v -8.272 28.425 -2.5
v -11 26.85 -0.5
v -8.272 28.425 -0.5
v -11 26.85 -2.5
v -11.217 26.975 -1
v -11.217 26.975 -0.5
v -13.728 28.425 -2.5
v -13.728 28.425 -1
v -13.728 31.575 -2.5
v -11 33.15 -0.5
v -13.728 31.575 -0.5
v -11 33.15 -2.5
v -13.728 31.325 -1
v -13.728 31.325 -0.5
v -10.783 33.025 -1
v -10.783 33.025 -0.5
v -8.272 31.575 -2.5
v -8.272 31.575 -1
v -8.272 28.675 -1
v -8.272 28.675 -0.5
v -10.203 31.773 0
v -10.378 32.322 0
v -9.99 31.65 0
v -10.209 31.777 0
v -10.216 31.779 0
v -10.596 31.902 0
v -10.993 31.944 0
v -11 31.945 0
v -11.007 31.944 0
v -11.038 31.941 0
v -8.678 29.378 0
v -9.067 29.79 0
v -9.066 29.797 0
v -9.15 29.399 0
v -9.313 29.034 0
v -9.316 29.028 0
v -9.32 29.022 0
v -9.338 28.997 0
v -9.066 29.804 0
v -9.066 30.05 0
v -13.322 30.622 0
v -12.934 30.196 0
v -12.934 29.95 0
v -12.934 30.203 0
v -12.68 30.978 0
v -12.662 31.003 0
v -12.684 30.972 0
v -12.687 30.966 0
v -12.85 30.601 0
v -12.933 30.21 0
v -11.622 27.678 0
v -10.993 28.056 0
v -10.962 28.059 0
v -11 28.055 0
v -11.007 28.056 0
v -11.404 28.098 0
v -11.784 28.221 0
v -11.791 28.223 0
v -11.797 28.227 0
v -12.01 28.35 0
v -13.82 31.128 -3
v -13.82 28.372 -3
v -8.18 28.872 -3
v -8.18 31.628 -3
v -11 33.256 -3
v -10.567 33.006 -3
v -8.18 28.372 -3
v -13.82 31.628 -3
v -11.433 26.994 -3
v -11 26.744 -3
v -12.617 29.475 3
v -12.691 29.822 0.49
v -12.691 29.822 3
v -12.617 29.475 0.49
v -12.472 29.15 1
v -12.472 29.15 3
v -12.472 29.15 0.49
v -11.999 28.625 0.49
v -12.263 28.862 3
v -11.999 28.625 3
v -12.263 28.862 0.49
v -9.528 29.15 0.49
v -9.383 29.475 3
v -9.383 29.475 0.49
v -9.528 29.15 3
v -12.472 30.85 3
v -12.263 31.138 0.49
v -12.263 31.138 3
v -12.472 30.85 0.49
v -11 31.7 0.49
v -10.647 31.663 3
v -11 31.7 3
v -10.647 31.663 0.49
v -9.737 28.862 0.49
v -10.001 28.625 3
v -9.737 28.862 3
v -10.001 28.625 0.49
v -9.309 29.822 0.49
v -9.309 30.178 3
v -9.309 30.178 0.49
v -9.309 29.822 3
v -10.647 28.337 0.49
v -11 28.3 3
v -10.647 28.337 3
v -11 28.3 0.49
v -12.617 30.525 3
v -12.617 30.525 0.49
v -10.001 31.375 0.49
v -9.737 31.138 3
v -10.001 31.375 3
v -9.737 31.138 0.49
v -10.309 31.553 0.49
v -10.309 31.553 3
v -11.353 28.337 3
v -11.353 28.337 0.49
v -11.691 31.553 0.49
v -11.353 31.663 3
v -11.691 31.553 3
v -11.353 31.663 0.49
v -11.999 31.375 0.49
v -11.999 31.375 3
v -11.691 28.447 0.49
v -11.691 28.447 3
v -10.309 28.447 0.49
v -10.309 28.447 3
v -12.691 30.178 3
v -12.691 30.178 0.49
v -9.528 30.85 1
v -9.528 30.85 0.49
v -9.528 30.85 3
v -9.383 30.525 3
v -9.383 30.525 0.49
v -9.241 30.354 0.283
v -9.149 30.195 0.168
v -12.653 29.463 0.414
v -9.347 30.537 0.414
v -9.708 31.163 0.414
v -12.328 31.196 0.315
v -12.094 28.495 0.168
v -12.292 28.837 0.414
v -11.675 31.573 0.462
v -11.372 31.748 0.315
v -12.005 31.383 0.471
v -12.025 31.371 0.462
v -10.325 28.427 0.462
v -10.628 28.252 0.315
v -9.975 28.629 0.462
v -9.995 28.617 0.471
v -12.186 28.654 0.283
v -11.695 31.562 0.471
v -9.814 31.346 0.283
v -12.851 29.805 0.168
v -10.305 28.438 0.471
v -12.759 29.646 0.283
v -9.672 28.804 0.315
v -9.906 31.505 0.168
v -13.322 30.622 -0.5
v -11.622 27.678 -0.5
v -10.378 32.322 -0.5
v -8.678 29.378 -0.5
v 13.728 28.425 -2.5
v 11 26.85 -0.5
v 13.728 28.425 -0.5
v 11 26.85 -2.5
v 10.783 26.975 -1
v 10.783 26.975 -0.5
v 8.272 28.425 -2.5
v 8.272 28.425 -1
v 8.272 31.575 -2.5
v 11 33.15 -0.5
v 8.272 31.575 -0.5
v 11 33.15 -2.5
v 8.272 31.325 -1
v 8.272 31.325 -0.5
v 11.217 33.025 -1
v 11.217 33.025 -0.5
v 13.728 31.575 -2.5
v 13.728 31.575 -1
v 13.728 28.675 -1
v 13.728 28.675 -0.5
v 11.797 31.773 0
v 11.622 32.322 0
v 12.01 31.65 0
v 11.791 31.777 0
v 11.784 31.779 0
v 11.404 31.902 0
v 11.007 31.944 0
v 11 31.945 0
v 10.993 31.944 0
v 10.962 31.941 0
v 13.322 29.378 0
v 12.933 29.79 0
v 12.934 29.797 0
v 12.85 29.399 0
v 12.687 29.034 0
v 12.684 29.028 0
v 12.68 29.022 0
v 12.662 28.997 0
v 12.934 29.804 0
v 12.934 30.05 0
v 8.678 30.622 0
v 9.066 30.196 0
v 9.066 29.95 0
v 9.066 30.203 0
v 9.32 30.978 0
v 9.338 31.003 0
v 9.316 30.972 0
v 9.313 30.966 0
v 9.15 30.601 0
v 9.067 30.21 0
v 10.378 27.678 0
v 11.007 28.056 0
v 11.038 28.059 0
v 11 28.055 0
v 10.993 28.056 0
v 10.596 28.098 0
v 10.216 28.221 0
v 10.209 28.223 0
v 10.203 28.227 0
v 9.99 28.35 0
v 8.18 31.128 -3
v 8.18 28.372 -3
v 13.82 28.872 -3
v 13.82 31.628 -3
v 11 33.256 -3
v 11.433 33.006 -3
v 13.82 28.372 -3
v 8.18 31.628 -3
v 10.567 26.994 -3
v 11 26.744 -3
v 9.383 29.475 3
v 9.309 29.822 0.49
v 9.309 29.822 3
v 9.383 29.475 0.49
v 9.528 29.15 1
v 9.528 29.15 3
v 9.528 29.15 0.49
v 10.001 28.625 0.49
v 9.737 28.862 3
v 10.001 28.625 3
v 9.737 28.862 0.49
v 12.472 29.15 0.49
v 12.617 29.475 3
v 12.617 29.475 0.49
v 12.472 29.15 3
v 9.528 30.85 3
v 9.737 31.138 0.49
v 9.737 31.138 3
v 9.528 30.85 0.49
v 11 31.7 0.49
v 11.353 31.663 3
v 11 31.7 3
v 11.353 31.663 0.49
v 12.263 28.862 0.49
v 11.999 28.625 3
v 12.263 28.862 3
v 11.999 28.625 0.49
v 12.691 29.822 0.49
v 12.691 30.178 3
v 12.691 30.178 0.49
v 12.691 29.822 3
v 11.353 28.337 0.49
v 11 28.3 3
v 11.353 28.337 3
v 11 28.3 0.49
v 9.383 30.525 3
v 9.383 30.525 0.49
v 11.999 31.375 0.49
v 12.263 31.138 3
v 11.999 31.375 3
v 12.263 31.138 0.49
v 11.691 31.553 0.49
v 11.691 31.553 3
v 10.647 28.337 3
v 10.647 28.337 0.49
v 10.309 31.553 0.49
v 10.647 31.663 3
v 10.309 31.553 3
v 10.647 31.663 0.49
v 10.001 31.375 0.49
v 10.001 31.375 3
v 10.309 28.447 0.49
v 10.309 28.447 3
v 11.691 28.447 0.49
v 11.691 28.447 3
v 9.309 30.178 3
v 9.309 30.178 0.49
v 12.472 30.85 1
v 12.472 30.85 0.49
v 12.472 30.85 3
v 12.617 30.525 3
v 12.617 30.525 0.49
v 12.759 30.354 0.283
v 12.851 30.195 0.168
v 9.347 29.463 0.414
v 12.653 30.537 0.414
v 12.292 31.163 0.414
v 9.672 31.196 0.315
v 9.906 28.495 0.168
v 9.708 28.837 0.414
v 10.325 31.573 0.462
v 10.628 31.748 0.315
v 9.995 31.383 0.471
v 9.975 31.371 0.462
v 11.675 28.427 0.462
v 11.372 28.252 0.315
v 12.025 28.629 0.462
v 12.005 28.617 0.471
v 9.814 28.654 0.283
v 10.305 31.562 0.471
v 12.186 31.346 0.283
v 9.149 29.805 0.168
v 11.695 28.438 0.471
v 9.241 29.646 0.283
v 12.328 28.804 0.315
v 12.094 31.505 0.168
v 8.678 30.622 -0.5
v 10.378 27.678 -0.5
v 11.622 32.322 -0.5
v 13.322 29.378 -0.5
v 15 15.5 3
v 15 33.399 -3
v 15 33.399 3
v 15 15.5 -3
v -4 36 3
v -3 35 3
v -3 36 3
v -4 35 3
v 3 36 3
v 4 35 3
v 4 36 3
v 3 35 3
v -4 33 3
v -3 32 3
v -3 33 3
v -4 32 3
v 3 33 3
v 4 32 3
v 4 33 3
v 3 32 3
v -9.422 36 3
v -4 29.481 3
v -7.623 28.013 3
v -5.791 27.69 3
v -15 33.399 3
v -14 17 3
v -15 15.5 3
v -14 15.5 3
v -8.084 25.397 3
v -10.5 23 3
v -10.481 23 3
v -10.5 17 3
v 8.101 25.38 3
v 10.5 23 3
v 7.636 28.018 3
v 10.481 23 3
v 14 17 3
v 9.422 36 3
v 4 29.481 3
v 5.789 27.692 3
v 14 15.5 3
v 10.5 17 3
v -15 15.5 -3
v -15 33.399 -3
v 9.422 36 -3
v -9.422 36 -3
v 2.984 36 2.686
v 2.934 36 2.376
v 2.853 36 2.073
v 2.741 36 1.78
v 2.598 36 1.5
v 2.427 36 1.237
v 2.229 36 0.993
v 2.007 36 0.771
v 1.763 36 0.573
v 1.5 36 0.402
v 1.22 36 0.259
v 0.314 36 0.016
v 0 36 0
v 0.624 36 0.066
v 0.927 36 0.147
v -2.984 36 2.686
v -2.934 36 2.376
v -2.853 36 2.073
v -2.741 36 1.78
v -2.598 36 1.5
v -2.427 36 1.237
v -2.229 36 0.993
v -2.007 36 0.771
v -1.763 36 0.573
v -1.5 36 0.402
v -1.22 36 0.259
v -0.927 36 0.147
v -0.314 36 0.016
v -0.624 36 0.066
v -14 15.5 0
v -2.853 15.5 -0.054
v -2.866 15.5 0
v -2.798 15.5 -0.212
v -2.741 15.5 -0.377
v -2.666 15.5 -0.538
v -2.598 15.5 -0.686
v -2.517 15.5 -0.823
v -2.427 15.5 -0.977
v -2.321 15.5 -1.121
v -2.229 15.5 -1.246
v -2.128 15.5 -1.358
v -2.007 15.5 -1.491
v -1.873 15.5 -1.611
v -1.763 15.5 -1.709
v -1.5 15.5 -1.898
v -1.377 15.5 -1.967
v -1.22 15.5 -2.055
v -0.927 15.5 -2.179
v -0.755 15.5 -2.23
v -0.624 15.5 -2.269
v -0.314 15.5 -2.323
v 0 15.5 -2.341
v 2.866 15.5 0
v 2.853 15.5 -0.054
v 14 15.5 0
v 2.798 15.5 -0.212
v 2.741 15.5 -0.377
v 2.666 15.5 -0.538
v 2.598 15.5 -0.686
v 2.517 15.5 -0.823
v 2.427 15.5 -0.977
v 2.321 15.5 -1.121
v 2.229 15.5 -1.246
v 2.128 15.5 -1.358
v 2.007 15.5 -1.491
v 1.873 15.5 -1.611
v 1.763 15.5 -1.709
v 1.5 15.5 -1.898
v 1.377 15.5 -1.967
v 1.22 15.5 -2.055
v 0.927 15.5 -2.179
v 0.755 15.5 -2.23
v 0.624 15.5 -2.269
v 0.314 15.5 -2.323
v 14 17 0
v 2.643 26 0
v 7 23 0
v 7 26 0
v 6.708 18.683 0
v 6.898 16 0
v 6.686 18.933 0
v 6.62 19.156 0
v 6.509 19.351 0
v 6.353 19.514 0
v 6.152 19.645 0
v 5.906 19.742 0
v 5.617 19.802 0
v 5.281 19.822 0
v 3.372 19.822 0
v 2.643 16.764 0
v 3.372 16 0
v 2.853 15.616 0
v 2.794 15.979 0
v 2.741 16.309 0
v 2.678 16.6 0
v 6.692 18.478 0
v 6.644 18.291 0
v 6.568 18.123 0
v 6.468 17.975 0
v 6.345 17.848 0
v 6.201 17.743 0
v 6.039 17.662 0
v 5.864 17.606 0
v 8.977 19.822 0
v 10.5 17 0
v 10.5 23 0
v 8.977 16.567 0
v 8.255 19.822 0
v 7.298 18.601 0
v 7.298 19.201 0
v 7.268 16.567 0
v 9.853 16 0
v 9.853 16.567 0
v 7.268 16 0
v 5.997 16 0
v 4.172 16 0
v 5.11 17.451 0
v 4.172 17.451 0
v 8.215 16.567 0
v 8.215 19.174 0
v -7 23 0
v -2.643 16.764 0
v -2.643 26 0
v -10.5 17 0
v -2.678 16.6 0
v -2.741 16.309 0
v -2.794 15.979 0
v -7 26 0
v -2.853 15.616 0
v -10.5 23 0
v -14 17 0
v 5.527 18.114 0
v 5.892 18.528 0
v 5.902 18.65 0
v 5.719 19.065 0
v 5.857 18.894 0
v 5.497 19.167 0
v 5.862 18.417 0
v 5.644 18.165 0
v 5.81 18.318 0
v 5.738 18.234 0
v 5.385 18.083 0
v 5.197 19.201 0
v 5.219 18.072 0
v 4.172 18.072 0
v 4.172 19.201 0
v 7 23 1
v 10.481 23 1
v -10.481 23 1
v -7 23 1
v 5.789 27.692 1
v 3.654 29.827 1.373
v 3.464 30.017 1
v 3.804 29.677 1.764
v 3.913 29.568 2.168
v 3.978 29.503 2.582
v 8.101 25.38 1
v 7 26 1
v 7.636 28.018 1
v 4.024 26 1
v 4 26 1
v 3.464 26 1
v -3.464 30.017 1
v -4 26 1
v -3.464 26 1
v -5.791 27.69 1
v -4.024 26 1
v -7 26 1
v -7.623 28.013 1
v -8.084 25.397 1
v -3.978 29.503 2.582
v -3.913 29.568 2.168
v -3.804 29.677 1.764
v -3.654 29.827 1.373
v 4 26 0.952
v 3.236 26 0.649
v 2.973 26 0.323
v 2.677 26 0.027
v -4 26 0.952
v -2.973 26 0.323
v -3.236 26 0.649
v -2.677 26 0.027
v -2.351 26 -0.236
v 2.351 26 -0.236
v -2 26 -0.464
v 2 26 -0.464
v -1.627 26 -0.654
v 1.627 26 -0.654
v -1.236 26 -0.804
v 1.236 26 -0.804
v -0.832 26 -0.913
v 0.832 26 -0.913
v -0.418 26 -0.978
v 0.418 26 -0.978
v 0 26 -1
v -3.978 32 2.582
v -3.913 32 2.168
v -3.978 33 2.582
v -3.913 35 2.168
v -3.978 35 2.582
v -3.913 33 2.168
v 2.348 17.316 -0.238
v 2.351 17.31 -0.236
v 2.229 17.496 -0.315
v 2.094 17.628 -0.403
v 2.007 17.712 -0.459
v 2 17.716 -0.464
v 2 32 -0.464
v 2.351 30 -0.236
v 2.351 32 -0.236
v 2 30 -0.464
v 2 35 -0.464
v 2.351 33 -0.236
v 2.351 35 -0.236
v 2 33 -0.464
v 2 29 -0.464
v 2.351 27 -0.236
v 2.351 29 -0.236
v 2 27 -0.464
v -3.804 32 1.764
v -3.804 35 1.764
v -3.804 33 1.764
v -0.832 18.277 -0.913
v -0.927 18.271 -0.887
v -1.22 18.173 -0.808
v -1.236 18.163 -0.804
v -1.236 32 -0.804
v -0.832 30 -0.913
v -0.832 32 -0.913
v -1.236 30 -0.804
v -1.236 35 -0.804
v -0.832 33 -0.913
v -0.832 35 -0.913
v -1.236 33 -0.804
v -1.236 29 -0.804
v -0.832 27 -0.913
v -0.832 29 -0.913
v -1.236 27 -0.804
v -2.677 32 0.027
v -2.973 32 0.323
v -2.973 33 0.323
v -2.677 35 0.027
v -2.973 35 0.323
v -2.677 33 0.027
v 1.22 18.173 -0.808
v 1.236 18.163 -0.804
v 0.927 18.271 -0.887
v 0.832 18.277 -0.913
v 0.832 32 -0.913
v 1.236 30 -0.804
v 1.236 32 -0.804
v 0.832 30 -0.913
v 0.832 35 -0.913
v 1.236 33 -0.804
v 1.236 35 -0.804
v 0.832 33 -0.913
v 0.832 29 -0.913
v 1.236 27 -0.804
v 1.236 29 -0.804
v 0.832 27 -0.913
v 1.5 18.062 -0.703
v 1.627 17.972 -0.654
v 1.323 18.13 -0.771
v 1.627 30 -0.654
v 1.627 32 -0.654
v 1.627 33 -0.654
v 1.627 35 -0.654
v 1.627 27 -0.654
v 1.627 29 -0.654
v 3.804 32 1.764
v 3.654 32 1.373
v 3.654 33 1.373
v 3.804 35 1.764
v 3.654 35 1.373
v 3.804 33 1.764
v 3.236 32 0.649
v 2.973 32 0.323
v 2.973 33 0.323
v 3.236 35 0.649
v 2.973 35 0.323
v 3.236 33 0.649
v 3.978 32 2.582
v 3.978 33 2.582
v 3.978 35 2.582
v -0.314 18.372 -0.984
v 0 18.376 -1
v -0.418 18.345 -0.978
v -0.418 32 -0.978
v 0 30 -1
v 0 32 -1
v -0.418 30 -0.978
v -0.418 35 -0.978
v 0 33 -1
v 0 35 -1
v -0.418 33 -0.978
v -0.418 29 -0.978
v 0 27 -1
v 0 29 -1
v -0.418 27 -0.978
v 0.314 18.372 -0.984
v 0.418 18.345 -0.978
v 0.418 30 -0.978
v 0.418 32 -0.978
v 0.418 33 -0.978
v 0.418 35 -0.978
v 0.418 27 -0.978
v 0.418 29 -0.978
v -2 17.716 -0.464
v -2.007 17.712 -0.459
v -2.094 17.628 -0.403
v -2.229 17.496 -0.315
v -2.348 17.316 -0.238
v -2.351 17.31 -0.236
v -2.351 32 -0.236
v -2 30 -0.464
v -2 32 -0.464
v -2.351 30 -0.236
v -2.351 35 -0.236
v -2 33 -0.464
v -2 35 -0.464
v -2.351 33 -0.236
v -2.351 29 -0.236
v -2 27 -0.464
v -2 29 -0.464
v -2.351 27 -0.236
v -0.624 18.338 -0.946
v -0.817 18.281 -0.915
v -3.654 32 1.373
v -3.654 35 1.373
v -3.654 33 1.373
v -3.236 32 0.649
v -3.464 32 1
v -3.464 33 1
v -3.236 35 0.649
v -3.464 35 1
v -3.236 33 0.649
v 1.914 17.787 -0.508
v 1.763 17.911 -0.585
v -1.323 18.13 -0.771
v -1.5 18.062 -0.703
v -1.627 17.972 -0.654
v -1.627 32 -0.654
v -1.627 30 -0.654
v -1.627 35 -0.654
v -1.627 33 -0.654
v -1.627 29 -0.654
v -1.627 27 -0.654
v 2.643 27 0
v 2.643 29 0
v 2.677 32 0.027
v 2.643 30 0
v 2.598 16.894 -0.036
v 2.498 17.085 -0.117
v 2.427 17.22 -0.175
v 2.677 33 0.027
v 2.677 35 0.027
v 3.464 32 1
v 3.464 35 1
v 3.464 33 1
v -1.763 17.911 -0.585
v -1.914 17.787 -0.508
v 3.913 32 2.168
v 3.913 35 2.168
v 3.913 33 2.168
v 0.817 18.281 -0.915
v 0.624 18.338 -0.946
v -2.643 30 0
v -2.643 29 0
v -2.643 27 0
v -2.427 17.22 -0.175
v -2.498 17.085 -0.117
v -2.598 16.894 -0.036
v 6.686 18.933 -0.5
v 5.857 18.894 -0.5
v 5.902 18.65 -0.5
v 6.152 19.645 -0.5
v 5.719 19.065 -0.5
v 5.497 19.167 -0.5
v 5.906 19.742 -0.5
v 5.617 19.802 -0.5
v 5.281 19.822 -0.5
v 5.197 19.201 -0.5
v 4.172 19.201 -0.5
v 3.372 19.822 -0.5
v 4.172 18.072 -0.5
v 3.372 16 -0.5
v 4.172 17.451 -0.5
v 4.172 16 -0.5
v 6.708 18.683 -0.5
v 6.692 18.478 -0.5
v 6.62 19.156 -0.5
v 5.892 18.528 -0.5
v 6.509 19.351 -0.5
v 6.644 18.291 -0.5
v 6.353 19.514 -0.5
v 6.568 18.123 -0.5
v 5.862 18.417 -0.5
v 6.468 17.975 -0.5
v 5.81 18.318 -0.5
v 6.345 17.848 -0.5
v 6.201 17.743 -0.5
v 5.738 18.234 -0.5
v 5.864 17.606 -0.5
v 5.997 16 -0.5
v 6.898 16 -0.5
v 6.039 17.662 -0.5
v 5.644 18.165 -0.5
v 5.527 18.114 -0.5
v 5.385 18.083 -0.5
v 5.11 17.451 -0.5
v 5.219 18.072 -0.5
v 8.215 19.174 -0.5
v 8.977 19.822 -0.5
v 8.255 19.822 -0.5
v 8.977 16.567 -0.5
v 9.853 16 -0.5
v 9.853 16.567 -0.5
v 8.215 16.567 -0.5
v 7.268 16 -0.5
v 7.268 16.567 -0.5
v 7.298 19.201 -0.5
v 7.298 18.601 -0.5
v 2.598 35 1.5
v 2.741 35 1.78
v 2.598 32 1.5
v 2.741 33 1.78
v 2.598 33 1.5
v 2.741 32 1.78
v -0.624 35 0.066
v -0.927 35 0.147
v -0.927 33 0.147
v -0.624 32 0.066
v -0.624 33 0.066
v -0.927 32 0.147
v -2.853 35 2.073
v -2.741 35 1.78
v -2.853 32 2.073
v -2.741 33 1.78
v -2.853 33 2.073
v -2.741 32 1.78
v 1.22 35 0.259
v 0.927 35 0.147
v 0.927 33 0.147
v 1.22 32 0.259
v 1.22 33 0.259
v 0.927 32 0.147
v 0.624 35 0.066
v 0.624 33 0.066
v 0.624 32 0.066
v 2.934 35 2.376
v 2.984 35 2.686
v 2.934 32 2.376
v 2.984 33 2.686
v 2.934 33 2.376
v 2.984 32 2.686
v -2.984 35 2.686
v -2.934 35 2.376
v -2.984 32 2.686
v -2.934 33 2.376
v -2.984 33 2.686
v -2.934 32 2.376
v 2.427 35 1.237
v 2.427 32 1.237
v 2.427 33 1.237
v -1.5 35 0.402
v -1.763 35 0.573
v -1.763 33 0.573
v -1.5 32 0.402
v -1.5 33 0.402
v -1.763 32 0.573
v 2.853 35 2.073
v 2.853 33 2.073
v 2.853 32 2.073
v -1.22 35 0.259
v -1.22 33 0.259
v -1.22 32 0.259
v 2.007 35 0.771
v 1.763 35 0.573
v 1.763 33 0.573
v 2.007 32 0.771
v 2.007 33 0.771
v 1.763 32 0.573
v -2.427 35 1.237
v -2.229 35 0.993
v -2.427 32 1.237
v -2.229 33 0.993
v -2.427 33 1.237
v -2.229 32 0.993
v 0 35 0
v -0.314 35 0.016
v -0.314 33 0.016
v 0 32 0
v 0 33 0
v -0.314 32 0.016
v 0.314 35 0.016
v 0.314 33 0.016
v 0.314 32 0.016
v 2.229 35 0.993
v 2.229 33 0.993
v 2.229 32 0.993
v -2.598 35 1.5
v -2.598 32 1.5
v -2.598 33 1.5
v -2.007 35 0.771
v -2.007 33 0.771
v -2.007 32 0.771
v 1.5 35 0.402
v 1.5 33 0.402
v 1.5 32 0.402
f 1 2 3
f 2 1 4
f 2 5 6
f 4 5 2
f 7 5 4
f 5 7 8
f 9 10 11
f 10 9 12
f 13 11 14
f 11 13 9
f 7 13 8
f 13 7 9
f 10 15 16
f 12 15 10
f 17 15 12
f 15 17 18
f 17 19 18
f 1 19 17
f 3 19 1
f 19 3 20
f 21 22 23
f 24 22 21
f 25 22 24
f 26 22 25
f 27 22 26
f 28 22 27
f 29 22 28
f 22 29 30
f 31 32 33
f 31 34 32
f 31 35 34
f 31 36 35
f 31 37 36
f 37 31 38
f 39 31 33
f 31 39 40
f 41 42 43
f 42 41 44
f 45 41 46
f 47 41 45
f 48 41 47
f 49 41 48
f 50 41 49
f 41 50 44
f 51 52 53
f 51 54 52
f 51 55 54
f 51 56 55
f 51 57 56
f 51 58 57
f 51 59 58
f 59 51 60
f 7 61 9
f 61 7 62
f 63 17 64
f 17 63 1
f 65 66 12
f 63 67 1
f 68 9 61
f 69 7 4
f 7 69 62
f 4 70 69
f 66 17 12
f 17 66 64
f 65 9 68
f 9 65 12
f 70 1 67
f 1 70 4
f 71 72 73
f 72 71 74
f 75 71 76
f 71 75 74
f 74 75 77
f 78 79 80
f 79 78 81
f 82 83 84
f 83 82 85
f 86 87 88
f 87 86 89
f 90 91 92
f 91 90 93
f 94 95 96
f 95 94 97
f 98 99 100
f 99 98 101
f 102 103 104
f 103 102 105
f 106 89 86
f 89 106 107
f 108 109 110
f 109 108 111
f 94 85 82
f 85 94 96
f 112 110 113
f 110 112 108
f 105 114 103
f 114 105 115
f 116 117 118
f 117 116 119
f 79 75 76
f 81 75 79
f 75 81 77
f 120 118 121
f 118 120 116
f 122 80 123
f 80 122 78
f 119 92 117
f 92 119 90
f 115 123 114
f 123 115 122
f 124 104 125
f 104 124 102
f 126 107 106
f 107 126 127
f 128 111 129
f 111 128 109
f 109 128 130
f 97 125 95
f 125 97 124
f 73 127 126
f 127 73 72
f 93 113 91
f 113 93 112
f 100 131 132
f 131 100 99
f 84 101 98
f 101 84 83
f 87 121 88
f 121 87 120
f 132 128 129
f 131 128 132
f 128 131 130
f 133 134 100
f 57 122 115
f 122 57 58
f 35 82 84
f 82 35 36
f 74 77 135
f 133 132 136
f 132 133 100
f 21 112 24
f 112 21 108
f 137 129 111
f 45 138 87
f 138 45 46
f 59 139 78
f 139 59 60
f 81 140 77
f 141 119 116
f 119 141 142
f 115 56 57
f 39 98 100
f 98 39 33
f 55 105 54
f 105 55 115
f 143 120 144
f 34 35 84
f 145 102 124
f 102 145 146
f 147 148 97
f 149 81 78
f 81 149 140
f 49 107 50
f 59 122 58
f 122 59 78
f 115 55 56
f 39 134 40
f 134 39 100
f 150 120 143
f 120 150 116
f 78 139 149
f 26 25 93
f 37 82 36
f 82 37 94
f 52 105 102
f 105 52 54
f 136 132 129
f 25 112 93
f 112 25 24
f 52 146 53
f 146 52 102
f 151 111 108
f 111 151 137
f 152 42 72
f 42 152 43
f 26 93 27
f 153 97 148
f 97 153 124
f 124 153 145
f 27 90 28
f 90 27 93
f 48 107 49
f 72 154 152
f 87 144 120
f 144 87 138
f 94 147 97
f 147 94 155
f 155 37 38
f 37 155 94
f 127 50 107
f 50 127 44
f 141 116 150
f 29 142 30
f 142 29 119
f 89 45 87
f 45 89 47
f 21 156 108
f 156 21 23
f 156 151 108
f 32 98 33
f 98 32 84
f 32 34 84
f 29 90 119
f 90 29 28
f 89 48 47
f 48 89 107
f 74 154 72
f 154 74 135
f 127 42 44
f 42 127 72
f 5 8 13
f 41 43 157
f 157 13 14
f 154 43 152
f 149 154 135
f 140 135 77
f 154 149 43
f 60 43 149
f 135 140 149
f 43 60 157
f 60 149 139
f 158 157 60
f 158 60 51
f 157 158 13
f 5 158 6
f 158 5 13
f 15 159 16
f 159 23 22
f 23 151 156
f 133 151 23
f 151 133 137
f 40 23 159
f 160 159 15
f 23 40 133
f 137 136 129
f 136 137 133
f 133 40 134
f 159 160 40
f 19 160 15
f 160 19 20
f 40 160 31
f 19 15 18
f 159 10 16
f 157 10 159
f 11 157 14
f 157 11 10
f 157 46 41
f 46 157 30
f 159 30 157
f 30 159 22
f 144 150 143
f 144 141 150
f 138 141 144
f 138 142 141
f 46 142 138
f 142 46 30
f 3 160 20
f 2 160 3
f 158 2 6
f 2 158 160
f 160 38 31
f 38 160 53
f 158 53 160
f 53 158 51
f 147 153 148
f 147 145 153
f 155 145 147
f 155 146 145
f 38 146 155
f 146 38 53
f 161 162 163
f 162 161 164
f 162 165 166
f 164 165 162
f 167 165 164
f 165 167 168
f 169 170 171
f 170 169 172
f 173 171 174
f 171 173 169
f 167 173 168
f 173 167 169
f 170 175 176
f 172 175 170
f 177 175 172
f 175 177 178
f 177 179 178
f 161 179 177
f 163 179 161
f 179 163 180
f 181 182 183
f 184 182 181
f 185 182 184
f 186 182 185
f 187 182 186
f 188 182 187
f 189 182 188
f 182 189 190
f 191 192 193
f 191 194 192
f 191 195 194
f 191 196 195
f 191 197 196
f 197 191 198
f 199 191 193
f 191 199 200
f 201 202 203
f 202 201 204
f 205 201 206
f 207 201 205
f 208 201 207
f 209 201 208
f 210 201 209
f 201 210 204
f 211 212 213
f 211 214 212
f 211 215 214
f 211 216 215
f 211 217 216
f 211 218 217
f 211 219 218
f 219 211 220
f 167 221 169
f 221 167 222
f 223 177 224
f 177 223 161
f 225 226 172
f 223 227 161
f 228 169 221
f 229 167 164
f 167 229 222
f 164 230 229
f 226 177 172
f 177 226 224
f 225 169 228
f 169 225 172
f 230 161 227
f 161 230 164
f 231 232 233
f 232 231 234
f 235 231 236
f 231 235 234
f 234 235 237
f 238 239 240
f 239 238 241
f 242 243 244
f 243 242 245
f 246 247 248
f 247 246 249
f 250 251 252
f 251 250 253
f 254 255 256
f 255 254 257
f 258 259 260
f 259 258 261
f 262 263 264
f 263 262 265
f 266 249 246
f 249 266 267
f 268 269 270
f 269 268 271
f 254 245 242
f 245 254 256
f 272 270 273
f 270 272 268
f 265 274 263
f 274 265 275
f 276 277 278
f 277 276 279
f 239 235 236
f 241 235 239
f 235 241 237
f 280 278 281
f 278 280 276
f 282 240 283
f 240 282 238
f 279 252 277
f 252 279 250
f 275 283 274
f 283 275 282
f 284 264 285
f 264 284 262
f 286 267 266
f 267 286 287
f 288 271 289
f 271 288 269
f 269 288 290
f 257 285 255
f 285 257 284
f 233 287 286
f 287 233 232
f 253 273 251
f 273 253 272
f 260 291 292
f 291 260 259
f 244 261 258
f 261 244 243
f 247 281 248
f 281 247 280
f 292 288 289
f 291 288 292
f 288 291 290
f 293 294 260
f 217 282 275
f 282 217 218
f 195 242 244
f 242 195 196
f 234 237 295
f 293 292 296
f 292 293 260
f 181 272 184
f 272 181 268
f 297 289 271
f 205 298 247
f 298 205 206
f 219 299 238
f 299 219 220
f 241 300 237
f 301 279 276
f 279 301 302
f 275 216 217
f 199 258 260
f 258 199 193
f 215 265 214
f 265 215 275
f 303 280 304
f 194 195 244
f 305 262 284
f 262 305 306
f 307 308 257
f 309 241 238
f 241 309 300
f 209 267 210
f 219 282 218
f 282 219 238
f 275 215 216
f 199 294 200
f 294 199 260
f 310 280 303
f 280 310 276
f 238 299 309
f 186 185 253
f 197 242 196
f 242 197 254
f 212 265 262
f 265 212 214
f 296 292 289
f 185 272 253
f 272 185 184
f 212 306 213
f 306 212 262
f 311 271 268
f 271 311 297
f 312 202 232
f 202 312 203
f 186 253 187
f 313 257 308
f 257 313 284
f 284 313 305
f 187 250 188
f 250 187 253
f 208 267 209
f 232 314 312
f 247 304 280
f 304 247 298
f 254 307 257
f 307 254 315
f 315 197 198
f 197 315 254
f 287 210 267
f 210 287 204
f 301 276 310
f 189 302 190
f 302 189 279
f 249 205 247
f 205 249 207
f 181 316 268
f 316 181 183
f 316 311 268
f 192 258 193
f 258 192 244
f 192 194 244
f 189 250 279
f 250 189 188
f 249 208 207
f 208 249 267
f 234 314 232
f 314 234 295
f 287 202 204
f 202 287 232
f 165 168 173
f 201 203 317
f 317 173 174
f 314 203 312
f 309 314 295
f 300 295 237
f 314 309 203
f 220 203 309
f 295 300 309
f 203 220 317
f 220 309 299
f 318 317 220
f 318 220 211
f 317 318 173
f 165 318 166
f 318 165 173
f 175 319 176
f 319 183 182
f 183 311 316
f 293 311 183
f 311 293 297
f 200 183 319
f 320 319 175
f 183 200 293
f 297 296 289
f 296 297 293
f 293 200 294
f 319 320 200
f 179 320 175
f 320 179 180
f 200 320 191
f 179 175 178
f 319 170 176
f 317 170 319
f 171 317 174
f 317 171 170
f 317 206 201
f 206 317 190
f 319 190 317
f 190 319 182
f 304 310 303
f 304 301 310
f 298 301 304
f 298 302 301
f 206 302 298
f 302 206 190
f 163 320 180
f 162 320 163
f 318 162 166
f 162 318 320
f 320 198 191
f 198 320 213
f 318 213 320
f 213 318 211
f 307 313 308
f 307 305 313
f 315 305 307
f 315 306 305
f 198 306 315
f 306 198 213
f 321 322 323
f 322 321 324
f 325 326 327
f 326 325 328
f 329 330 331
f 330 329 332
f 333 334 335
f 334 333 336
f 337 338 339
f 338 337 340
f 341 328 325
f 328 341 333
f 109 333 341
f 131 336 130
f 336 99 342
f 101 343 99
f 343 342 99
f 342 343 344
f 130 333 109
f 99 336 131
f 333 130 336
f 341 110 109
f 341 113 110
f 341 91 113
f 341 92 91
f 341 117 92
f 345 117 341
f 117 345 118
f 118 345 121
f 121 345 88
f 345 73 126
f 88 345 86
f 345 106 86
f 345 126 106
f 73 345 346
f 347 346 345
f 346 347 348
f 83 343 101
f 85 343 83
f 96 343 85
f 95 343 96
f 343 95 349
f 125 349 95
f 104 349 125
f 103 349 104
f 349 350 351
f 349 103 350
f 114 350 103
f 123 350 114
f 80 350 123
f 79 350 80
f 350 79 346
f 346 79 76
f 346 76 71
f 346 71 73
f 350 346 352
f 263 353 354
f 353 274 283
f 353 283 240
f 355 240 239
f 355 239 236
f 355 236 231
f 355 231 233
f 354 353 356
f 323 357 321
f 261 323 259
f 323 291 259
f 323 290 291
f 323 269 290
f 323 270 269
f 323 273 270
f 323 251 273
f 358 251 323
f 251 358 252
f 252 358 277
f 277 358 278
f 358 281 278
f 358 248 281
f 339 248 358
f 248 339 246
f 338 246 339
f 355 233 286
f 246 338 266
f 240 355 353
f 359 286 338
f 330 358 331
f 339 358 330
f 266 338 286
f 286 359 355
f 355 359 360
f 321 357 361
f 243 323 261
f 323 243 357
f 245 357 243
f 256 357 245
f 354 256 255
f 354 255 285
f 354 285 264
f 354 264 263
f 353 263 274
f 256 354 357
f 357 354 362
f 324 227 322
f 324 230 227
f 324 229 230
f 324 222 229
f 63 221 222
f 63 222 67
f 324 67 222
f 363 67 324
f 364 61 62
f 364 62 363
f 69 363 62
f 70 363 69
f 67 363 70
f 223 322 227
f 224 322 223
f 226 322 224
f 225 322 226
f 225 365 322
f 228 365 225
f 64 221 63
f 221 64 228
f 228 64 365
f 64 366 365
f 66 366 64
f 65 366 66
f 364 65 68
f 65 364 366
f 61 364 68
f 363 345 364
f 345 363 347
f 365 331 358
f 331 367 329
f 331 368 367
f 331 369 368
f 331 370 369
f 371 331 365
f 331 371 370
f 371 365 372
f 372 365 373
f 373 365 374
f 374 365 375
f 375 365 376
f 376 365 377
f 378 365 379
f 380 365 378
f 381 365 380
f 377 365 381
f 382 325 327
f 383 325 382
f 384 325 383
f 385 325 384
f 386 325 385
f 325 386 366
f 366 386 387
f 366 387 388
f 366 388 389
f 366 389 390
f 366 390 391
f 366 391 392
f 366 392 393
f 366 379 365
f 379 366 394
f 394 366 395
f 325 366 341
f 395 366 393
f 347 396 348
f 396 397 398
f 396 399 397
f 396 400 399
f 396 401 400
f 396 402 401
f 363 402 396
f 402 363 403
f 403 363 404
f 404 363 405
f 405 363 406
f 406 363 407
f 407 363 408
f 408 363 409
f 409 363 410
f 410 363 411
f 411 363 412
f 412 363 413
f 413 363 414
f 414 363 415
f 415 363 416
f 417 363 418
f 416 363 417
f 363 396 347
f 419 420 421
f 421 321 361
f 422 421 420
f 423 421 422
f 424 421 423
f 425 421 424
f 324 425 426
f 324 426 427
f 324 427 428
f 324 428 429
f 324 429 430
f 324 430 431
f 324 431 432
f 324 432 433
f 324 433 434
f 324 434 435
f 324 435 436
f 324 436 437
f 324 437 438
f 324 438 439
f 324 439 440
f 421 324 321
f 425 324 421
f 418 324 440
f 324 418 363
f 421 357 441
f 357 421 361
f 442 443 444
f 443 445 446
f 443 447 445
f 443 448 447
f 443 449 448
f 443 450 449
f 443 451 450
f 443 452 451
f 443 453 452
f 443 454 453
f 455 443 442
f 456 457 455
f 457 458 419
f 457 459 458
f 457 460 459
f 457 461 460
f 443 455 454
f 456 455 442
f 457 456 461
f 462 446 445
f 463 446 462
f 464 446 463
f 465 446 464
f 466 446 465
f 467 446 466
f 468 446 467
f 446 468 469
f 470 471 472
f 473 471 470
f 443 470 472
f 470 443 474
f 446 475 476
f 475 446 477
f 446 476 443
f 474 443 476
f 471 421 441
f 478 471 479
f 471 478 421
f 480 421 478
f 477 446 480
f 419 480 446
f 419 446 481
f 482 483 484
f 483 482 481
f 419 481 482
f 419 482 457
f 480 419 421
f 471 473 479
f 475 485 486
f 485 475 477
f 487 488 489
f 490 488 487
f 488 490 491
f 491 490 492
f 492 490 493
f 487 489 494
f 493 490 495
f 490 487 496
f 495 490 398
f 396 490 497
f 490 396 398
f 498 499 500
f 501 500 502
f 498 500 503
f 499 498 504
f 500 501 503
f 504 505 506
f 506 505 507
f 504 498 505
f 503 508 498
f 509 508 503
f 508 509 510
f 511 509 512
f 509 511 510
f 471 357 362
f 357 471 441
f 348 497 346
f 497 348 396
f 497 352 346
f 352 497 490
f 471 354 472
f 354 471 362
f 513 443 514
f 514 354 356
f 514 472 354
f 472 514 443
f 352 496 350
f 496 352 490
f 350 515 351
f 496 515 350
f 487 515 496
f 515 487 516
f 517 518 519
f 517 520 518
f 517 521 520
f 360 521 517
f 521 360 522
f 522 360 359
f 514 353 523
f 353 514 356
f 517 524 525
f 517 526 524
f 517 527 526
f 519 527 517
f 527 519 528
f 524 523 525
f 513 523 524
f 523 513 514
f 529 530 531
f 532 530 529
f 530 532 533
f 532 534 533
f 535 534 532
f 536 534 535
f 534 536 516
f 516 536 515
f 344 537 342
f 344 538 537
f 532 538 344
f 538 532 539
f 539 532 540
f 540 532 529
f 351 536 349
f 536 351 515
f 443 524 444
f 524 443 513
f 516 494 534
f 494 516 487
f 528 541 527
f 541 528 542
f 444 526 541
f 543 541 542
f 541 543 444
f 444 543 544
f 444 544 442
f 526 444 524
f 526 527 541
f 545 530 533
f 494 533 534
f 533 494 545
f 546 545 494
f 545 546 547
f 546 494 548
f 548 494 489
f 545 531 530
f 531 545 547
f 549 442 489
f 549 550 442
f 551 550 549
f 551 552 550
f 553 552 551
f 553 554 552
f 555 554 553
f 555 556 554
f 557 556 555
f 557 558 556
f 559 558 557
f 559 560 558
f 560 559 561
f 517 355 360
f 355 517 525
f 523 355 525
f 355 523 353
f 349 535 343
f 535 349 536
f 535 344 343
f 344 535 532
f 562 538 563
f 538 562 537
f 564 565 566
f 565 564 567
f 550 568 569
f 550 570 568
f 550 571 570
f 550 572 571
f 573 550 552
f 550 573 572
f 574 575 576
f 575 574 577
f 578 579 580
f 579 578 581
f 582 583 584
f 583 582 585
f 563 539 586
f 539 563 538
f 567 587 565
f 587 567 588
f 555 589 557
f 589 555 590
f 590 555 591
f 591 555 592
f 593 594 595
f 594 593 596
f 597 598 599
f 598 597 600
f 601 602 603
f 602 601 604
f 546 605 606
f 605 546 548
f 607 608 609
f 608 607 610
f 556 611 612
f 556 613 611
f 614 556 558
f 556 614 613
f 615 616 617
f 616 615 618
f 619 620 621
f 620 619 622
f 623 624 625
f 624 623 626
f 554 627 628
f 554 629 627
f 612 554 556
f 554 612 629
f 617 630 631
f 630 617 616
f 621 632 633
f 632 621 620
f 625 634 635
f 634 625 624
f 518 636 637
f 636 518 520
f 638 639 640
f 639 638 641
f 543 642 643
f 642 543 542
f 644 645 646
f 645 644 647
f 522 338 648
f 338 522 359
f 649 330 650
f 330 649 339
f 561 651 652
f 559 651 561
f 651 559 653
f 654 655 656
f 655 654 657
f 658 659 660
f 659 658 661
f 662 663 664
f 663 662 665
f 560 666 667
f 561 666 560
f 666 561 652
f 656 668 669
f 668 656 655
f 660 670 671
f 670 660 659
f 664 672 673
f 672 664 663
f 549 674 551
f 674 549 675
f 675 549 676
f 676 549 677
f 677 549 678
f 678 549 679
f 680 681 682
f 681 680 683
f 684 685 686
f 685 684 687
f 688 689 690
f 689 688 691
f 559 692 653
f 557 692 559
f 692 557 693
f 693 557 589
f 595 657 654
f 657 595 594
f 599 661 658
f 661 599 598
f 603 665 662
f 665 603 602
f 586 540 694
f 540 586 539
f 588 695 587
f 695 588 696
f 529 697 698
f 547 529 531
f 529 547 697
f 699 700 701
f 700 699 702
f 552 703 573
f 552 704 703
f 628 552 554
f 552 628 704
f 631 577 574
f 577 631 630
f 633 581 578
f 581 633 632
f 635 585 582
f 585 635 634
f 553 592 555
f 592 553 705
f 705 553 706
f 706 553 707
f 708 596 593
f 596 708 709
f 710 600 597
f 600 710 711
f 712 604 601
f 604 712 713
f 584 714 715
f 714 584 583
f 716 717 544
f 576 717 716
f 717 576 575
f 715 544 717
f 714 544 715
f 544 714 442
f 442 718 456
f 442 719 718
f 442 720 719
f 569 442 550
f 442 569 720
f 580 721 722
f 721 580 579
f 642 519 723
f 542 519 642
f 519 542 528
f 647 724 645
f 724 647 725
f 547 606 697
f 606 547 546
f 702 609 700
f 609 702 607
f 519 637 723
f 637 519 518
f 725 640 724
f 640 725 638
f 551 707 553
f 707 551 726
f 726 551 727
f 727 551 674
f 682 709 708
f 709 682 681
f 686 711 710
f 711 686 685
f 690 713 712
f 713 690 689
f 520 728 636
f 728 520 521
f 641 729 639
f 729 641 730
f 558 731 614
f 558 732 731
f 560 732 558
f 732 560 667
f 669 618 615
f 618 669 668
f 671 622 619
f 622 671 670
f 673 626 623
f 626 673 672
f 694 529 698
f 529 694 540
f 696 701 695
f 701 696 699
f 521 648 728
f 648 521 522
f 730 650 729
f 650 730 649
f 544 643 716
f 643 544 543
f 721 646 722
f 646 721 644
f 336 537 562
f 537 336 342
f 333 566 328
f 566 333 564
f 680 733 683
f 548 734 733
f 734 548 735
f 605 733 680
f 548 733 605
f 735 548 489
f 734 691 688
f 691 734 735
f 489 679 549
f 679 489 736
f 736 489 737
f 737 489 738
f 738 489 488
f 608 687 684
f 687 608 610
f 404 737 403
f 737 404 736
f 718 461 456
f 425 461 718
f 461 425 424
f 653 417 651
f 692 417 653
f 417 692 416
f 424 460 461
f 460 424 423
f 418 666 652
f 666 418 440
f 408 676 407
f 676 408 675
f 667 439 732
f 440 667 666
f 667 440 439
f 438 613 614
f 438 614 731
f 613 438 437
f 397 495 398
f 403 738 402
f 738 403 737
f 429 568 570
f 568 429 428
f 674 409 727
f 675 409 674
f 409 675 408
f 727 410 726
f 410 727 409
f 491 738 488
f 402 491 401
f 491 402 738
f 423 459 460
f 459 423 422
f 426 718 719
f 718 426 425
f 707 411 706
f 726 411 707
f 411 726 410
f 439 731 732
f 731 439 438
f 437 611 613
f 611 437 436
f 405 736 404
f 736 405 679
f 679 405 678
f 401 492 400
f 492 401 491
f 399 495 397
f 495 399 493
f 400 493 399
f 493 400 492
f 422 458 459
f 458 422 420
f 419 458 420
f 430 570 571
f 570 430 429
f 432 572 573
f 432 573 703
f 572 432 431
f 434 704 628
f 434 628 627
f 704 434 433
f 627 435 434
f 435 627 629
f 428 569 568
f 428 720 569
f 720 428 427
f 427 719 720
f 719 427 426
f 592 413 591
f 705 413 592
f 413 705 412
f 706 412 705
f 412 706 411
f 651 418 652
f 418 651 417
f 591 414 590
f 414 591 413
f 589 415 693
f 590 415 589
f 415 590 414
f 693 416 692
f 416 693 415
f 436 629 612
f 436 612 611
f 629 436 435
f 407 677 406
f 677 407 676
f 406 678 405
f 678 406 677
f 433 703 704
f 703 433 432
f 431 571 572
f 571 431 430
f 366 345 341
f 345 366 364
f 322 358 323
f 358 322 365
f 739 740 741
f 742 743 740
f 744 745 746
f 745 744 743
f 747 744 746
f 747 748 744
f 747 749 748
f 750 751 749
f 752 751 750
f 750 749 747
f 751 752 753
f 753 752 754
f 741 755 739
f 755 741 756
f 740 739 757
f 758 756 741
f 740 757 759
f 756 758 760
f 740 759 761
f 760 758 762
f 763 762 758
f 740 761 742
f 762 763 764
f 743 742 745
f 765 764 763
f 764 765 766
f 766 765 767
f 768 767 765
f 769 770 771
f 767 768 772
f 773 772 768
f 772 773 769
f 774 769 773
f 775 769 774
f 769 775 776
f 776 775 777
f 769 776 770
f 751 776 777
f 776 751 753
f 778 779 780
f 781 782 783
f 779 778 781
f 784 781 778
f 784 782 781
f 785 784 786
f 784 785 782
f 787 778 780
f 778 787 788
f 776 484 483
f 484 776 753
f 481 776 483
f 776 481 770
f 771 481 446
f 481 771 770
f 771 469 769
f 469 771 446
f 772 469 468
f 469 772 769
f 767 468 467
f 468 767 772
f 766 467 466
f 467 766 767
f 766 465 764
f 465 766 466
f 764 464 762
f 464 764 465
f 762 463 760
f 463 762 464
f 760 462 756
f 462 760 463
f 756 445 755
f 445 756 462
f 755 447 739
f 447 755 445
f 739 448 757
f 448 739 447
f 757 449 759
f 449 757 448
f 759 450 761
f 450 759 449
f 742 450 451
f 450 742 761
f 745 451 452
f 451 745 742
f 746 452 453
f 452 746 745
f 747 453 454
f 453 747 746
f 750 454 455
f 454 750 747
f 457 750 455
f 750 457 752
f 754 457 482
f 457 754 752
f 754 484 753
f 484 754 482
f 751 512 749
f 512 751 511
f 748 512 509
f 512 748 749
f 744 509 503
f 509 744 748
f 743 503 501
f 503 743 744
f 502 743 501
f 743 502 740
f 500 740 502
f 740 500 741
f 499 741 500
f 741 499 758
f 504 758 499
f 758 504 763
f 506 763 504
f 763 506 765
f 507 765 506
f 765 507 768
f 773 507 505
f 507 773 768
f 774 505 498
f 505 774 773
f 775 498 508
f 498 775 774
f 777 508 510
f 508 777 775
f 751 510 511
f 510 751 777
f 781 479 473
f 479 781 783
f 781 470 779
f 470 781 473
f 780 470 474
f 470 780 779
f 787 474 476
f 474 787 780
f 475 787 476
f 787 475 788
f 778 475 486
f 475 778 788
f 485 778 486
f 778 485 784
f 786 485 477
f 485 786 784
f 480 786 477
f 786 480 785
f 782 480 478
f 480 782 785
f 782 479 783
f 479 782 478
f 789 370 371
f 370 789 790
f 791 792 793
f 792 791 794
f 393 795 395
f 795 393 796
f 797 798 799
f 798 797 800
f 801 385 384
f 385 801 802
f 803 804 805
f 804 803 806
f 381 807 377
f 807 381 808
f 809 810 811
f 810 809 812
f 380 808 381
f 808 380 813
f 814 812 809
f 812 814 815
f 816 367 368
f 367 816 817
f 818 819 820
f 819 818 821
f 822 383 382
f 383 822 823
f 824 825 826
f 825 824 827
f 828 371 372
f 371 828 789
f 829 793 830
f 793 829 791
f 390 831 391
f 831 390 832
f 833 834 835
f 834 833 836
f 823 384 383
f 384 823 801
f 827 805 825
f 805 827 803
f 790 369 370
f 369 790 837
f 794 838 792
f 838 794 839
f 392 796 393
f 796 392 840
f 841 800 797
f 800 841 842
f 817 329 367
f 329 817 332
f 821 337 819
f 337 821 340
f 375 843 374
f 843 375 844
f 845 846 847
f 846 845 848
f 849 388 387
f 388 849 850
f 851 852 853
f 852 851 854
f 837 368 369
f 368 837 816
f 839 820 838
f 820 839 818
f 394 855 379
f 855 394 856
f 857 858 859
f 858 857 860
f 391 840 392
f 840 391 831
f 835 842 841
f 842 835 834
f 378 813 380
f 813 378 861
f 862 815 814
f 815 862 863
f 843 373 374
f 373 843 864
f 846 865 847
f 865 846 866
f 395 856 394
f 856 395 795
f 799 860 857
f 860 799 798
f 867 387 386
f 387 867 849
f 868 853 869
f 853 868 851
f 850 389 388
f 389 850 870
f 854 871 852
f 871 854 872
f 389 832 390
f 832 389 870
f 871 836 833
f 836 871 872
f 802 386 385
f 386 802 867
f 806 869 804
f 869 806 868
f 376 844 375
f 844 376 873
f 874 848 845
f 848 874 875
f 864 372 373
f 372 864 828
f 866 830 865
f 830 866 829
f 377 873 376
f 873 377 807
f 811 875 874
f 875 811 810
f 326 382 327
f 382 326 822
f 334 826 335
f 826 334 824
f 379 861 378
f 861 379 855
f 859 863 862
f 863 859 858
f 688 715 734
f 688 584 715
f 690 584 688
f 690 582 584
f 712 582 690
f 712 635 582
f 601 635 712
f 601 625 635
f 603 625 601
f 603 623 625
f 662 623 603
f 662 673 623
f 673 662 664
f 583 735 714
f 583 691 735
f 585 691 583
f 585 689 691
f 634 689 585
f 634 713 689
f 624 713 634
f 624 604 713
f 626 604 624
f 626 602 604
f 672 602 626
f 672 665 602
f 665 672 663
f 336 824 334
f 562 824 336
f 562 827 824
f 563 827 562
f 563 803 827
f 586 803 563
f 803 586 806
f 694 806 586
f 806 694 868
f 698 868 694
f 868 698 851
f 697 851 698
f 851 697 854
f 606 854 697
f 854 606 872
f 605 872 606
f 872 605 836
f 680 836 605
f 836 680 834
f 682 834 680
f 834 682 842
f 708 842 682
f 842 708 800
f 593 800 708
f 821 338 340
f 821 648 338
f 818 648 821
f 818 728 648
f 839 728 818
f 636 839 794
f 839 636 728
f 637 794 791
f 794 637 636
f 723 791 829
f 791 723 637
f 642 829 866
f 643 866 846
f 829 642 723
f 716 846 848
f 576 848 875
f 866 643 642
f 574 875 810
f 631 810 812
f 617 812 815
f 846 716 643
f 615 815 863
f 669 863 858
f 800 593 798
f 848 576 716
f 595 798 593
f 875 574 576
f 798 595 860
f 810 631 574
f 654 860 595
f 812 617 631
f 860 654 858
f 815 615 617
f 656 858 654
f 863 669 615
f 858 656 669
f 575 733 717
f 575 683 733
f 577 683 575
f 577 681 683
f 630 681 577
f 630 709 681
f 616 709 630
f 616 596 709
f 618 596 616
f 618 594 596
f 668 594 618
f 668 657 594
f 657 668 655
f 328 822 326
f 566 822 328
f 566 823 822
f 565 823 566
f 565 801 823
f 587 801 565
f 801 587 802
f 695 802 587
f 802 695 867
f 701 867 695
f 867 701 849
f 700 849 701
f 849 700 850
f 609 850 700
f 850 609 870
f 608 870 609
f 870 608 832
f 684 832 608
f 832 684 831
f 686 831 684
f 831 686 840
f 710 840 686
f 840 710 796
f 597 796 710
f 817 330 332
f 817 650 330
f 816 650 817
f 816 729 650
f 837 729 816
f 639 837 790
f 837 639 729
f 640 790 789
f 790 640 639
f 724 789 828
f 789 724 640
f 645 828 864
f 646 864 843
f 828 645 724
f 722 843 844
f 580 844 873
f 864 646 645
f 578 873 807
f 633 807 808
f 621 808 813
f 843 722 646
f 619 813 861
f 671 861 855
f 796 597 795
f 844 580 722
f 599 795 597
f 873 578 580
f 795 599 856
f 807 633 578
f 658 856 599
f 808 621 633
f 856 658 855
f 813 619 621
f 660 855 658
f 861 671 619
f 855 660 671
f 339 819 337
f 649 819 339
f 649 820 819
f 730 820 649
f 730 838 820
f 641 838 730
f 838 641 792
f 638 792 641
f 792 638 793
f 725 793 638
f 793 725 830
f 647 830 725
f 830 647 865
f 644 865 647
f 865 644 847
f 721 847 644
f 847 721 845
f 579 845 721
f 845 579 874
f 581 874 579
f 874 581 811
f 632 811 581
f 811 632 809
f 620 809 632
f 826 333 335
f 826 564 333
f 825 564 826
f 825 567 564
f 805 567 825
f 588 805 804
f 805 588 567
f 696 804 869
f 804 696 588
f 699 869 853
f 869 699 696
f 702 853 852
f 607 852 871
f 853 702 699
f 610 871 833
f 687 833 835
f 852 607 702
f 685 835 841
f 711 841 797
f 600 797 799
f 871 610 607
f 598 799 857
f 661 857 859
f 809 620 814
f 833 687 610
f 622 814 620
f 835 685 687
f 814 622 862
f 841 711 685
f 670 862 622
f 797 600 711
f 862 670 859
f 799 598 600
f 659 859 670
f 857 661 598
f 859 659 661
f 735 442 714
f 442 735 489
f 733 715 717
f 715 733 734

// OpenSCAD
// PIRANHA iteration1
// heatbed cable cover clip
// GNU GPL v3
// Usan Siriwardana <usiriwar@uwaterloo.ca> and contributors
// based on Prusa i3 MK3S
// https://reprap.org/wiki/Prusa_i3_MK3

module m3_nut()
{
    difference()
    {
        union()
        {
            cylinder( h = 4, r = 3.15, $fn=6);  
            translate([0,0,2.5]) cylinder( h = 4, r1 = 3.15, r2=4,$fn=6);  
            translate([0,0,-9])  cylinder( h = 12, r = 1.7, $fn=30);  
            translate([0,0,-0.49]) cylinder( h = 0.5, r1 = 1.7, r2=1.95,$fn=30);  
        }
        translate([1.7,-5,-1]) cube([5,10,2]); 
        translate([-6.7,-5,-1]) cube([5,10,2]); 
        
        translate([-5,1.7,-1.5]) cube([10,5,2]); 
        translate([-5,-6.7,-1.5]) cube([10,5,2]); 
        
    }
}


module clip()
{
    
    difference()
    {
        // base body
        translate([-15,15.5,-3]) cube([30,20.5,6]); 
        
        // inner angled cut
        translate([3.5,2,0]) rotate([0,0,0])  cube([10.5,15,6]);
        translate([-14,2,0]) rotate([0,0,0])  cube([10.5,15,6]);
        
        translate([3.5,15,0]) rotate([0,0,0])  cube([7,8,6]);
        translate([-10.5,15,0]) rotate([0,0,0])  cube([7,8,6]);
       
        translate([6.96,19.45,1]) rotate([0,0,45])  cube([5,10,6]);
        translate([-6.96,19.45,1]) rotate([0,0,45])  cube([10,5,6]); 
        
        translate([-0,37,3]) rotate([90,0,0]) cylinder(h = 17, r=3.5, $fn=60);
            
        translate([-7,15,0]) rotate([0,0,0])  cube([14,11,6]);
       
        translate([3,14,1]) rotate([0,0,10])  cube([7,13,6]);
        translate([-9.88,15.21,1]) rotate([0,0,-10])  cube([7,13,6]); 
        
        // cables cut
        translate([-0,36,3]) rotate([90,0,0]) cylinder(h = 187, r=4, $fn=60); 
       
        translate([-11,30,0]) rotate([0,180,30]) m3_nut();
        translate([11,30,0]) rotate([0,180,30]) m3_nut();
       
        // thermistor cable entry
        translate([-0,22,4]) rotate([115,0,0]) cylinder(h = 15, r=3, $fn=60);     
    
    
        // edges  
        translate([-18.0,32,-5]) rotate([0,0,25])  cube([11,11,15]);
        translate([18,32,-5]) rotate([0,0,65])  cube([11,11,15]);
        
        // version
        translate([3,16,-0.5]) rotate([0,0,0]) linear_extrude(height = 0.6) 
        { text("R1",font = "helvetica:style=Bold", size=4); }
     
    }
    
    // cable rims
    difference()
    {
        difference()
        {
            translate([-0,36,3]) rotate([90,0,0]) cylinder(h = 10, r=4.5, $fn=60); 
            translate([-0,37,3]) rotate([90,0,0]) cylinder(h = 17, r=3, $fn=60);
            
        }
        translate([-15,18,3]) cube([30,20,6]);    
        translate([-15,27,-5]) cube([30,2,16]);    
        translate([-15,30,-5]) cube([30,2,16]);    
        translate([-15,33,-5]) cube([30,2,16]); 
        translate([6.96,19.45,1]) rotate([0,0,45])  cube([5,10,6]);
        translate([-6.96,19.45,1]) rotate([0,0,45])  cube([10,5,6]); 
        translate([-4,20,0]) rotate([0,0,0])  cube([8,11,6]); 
        
    }  
}


  


clip();
